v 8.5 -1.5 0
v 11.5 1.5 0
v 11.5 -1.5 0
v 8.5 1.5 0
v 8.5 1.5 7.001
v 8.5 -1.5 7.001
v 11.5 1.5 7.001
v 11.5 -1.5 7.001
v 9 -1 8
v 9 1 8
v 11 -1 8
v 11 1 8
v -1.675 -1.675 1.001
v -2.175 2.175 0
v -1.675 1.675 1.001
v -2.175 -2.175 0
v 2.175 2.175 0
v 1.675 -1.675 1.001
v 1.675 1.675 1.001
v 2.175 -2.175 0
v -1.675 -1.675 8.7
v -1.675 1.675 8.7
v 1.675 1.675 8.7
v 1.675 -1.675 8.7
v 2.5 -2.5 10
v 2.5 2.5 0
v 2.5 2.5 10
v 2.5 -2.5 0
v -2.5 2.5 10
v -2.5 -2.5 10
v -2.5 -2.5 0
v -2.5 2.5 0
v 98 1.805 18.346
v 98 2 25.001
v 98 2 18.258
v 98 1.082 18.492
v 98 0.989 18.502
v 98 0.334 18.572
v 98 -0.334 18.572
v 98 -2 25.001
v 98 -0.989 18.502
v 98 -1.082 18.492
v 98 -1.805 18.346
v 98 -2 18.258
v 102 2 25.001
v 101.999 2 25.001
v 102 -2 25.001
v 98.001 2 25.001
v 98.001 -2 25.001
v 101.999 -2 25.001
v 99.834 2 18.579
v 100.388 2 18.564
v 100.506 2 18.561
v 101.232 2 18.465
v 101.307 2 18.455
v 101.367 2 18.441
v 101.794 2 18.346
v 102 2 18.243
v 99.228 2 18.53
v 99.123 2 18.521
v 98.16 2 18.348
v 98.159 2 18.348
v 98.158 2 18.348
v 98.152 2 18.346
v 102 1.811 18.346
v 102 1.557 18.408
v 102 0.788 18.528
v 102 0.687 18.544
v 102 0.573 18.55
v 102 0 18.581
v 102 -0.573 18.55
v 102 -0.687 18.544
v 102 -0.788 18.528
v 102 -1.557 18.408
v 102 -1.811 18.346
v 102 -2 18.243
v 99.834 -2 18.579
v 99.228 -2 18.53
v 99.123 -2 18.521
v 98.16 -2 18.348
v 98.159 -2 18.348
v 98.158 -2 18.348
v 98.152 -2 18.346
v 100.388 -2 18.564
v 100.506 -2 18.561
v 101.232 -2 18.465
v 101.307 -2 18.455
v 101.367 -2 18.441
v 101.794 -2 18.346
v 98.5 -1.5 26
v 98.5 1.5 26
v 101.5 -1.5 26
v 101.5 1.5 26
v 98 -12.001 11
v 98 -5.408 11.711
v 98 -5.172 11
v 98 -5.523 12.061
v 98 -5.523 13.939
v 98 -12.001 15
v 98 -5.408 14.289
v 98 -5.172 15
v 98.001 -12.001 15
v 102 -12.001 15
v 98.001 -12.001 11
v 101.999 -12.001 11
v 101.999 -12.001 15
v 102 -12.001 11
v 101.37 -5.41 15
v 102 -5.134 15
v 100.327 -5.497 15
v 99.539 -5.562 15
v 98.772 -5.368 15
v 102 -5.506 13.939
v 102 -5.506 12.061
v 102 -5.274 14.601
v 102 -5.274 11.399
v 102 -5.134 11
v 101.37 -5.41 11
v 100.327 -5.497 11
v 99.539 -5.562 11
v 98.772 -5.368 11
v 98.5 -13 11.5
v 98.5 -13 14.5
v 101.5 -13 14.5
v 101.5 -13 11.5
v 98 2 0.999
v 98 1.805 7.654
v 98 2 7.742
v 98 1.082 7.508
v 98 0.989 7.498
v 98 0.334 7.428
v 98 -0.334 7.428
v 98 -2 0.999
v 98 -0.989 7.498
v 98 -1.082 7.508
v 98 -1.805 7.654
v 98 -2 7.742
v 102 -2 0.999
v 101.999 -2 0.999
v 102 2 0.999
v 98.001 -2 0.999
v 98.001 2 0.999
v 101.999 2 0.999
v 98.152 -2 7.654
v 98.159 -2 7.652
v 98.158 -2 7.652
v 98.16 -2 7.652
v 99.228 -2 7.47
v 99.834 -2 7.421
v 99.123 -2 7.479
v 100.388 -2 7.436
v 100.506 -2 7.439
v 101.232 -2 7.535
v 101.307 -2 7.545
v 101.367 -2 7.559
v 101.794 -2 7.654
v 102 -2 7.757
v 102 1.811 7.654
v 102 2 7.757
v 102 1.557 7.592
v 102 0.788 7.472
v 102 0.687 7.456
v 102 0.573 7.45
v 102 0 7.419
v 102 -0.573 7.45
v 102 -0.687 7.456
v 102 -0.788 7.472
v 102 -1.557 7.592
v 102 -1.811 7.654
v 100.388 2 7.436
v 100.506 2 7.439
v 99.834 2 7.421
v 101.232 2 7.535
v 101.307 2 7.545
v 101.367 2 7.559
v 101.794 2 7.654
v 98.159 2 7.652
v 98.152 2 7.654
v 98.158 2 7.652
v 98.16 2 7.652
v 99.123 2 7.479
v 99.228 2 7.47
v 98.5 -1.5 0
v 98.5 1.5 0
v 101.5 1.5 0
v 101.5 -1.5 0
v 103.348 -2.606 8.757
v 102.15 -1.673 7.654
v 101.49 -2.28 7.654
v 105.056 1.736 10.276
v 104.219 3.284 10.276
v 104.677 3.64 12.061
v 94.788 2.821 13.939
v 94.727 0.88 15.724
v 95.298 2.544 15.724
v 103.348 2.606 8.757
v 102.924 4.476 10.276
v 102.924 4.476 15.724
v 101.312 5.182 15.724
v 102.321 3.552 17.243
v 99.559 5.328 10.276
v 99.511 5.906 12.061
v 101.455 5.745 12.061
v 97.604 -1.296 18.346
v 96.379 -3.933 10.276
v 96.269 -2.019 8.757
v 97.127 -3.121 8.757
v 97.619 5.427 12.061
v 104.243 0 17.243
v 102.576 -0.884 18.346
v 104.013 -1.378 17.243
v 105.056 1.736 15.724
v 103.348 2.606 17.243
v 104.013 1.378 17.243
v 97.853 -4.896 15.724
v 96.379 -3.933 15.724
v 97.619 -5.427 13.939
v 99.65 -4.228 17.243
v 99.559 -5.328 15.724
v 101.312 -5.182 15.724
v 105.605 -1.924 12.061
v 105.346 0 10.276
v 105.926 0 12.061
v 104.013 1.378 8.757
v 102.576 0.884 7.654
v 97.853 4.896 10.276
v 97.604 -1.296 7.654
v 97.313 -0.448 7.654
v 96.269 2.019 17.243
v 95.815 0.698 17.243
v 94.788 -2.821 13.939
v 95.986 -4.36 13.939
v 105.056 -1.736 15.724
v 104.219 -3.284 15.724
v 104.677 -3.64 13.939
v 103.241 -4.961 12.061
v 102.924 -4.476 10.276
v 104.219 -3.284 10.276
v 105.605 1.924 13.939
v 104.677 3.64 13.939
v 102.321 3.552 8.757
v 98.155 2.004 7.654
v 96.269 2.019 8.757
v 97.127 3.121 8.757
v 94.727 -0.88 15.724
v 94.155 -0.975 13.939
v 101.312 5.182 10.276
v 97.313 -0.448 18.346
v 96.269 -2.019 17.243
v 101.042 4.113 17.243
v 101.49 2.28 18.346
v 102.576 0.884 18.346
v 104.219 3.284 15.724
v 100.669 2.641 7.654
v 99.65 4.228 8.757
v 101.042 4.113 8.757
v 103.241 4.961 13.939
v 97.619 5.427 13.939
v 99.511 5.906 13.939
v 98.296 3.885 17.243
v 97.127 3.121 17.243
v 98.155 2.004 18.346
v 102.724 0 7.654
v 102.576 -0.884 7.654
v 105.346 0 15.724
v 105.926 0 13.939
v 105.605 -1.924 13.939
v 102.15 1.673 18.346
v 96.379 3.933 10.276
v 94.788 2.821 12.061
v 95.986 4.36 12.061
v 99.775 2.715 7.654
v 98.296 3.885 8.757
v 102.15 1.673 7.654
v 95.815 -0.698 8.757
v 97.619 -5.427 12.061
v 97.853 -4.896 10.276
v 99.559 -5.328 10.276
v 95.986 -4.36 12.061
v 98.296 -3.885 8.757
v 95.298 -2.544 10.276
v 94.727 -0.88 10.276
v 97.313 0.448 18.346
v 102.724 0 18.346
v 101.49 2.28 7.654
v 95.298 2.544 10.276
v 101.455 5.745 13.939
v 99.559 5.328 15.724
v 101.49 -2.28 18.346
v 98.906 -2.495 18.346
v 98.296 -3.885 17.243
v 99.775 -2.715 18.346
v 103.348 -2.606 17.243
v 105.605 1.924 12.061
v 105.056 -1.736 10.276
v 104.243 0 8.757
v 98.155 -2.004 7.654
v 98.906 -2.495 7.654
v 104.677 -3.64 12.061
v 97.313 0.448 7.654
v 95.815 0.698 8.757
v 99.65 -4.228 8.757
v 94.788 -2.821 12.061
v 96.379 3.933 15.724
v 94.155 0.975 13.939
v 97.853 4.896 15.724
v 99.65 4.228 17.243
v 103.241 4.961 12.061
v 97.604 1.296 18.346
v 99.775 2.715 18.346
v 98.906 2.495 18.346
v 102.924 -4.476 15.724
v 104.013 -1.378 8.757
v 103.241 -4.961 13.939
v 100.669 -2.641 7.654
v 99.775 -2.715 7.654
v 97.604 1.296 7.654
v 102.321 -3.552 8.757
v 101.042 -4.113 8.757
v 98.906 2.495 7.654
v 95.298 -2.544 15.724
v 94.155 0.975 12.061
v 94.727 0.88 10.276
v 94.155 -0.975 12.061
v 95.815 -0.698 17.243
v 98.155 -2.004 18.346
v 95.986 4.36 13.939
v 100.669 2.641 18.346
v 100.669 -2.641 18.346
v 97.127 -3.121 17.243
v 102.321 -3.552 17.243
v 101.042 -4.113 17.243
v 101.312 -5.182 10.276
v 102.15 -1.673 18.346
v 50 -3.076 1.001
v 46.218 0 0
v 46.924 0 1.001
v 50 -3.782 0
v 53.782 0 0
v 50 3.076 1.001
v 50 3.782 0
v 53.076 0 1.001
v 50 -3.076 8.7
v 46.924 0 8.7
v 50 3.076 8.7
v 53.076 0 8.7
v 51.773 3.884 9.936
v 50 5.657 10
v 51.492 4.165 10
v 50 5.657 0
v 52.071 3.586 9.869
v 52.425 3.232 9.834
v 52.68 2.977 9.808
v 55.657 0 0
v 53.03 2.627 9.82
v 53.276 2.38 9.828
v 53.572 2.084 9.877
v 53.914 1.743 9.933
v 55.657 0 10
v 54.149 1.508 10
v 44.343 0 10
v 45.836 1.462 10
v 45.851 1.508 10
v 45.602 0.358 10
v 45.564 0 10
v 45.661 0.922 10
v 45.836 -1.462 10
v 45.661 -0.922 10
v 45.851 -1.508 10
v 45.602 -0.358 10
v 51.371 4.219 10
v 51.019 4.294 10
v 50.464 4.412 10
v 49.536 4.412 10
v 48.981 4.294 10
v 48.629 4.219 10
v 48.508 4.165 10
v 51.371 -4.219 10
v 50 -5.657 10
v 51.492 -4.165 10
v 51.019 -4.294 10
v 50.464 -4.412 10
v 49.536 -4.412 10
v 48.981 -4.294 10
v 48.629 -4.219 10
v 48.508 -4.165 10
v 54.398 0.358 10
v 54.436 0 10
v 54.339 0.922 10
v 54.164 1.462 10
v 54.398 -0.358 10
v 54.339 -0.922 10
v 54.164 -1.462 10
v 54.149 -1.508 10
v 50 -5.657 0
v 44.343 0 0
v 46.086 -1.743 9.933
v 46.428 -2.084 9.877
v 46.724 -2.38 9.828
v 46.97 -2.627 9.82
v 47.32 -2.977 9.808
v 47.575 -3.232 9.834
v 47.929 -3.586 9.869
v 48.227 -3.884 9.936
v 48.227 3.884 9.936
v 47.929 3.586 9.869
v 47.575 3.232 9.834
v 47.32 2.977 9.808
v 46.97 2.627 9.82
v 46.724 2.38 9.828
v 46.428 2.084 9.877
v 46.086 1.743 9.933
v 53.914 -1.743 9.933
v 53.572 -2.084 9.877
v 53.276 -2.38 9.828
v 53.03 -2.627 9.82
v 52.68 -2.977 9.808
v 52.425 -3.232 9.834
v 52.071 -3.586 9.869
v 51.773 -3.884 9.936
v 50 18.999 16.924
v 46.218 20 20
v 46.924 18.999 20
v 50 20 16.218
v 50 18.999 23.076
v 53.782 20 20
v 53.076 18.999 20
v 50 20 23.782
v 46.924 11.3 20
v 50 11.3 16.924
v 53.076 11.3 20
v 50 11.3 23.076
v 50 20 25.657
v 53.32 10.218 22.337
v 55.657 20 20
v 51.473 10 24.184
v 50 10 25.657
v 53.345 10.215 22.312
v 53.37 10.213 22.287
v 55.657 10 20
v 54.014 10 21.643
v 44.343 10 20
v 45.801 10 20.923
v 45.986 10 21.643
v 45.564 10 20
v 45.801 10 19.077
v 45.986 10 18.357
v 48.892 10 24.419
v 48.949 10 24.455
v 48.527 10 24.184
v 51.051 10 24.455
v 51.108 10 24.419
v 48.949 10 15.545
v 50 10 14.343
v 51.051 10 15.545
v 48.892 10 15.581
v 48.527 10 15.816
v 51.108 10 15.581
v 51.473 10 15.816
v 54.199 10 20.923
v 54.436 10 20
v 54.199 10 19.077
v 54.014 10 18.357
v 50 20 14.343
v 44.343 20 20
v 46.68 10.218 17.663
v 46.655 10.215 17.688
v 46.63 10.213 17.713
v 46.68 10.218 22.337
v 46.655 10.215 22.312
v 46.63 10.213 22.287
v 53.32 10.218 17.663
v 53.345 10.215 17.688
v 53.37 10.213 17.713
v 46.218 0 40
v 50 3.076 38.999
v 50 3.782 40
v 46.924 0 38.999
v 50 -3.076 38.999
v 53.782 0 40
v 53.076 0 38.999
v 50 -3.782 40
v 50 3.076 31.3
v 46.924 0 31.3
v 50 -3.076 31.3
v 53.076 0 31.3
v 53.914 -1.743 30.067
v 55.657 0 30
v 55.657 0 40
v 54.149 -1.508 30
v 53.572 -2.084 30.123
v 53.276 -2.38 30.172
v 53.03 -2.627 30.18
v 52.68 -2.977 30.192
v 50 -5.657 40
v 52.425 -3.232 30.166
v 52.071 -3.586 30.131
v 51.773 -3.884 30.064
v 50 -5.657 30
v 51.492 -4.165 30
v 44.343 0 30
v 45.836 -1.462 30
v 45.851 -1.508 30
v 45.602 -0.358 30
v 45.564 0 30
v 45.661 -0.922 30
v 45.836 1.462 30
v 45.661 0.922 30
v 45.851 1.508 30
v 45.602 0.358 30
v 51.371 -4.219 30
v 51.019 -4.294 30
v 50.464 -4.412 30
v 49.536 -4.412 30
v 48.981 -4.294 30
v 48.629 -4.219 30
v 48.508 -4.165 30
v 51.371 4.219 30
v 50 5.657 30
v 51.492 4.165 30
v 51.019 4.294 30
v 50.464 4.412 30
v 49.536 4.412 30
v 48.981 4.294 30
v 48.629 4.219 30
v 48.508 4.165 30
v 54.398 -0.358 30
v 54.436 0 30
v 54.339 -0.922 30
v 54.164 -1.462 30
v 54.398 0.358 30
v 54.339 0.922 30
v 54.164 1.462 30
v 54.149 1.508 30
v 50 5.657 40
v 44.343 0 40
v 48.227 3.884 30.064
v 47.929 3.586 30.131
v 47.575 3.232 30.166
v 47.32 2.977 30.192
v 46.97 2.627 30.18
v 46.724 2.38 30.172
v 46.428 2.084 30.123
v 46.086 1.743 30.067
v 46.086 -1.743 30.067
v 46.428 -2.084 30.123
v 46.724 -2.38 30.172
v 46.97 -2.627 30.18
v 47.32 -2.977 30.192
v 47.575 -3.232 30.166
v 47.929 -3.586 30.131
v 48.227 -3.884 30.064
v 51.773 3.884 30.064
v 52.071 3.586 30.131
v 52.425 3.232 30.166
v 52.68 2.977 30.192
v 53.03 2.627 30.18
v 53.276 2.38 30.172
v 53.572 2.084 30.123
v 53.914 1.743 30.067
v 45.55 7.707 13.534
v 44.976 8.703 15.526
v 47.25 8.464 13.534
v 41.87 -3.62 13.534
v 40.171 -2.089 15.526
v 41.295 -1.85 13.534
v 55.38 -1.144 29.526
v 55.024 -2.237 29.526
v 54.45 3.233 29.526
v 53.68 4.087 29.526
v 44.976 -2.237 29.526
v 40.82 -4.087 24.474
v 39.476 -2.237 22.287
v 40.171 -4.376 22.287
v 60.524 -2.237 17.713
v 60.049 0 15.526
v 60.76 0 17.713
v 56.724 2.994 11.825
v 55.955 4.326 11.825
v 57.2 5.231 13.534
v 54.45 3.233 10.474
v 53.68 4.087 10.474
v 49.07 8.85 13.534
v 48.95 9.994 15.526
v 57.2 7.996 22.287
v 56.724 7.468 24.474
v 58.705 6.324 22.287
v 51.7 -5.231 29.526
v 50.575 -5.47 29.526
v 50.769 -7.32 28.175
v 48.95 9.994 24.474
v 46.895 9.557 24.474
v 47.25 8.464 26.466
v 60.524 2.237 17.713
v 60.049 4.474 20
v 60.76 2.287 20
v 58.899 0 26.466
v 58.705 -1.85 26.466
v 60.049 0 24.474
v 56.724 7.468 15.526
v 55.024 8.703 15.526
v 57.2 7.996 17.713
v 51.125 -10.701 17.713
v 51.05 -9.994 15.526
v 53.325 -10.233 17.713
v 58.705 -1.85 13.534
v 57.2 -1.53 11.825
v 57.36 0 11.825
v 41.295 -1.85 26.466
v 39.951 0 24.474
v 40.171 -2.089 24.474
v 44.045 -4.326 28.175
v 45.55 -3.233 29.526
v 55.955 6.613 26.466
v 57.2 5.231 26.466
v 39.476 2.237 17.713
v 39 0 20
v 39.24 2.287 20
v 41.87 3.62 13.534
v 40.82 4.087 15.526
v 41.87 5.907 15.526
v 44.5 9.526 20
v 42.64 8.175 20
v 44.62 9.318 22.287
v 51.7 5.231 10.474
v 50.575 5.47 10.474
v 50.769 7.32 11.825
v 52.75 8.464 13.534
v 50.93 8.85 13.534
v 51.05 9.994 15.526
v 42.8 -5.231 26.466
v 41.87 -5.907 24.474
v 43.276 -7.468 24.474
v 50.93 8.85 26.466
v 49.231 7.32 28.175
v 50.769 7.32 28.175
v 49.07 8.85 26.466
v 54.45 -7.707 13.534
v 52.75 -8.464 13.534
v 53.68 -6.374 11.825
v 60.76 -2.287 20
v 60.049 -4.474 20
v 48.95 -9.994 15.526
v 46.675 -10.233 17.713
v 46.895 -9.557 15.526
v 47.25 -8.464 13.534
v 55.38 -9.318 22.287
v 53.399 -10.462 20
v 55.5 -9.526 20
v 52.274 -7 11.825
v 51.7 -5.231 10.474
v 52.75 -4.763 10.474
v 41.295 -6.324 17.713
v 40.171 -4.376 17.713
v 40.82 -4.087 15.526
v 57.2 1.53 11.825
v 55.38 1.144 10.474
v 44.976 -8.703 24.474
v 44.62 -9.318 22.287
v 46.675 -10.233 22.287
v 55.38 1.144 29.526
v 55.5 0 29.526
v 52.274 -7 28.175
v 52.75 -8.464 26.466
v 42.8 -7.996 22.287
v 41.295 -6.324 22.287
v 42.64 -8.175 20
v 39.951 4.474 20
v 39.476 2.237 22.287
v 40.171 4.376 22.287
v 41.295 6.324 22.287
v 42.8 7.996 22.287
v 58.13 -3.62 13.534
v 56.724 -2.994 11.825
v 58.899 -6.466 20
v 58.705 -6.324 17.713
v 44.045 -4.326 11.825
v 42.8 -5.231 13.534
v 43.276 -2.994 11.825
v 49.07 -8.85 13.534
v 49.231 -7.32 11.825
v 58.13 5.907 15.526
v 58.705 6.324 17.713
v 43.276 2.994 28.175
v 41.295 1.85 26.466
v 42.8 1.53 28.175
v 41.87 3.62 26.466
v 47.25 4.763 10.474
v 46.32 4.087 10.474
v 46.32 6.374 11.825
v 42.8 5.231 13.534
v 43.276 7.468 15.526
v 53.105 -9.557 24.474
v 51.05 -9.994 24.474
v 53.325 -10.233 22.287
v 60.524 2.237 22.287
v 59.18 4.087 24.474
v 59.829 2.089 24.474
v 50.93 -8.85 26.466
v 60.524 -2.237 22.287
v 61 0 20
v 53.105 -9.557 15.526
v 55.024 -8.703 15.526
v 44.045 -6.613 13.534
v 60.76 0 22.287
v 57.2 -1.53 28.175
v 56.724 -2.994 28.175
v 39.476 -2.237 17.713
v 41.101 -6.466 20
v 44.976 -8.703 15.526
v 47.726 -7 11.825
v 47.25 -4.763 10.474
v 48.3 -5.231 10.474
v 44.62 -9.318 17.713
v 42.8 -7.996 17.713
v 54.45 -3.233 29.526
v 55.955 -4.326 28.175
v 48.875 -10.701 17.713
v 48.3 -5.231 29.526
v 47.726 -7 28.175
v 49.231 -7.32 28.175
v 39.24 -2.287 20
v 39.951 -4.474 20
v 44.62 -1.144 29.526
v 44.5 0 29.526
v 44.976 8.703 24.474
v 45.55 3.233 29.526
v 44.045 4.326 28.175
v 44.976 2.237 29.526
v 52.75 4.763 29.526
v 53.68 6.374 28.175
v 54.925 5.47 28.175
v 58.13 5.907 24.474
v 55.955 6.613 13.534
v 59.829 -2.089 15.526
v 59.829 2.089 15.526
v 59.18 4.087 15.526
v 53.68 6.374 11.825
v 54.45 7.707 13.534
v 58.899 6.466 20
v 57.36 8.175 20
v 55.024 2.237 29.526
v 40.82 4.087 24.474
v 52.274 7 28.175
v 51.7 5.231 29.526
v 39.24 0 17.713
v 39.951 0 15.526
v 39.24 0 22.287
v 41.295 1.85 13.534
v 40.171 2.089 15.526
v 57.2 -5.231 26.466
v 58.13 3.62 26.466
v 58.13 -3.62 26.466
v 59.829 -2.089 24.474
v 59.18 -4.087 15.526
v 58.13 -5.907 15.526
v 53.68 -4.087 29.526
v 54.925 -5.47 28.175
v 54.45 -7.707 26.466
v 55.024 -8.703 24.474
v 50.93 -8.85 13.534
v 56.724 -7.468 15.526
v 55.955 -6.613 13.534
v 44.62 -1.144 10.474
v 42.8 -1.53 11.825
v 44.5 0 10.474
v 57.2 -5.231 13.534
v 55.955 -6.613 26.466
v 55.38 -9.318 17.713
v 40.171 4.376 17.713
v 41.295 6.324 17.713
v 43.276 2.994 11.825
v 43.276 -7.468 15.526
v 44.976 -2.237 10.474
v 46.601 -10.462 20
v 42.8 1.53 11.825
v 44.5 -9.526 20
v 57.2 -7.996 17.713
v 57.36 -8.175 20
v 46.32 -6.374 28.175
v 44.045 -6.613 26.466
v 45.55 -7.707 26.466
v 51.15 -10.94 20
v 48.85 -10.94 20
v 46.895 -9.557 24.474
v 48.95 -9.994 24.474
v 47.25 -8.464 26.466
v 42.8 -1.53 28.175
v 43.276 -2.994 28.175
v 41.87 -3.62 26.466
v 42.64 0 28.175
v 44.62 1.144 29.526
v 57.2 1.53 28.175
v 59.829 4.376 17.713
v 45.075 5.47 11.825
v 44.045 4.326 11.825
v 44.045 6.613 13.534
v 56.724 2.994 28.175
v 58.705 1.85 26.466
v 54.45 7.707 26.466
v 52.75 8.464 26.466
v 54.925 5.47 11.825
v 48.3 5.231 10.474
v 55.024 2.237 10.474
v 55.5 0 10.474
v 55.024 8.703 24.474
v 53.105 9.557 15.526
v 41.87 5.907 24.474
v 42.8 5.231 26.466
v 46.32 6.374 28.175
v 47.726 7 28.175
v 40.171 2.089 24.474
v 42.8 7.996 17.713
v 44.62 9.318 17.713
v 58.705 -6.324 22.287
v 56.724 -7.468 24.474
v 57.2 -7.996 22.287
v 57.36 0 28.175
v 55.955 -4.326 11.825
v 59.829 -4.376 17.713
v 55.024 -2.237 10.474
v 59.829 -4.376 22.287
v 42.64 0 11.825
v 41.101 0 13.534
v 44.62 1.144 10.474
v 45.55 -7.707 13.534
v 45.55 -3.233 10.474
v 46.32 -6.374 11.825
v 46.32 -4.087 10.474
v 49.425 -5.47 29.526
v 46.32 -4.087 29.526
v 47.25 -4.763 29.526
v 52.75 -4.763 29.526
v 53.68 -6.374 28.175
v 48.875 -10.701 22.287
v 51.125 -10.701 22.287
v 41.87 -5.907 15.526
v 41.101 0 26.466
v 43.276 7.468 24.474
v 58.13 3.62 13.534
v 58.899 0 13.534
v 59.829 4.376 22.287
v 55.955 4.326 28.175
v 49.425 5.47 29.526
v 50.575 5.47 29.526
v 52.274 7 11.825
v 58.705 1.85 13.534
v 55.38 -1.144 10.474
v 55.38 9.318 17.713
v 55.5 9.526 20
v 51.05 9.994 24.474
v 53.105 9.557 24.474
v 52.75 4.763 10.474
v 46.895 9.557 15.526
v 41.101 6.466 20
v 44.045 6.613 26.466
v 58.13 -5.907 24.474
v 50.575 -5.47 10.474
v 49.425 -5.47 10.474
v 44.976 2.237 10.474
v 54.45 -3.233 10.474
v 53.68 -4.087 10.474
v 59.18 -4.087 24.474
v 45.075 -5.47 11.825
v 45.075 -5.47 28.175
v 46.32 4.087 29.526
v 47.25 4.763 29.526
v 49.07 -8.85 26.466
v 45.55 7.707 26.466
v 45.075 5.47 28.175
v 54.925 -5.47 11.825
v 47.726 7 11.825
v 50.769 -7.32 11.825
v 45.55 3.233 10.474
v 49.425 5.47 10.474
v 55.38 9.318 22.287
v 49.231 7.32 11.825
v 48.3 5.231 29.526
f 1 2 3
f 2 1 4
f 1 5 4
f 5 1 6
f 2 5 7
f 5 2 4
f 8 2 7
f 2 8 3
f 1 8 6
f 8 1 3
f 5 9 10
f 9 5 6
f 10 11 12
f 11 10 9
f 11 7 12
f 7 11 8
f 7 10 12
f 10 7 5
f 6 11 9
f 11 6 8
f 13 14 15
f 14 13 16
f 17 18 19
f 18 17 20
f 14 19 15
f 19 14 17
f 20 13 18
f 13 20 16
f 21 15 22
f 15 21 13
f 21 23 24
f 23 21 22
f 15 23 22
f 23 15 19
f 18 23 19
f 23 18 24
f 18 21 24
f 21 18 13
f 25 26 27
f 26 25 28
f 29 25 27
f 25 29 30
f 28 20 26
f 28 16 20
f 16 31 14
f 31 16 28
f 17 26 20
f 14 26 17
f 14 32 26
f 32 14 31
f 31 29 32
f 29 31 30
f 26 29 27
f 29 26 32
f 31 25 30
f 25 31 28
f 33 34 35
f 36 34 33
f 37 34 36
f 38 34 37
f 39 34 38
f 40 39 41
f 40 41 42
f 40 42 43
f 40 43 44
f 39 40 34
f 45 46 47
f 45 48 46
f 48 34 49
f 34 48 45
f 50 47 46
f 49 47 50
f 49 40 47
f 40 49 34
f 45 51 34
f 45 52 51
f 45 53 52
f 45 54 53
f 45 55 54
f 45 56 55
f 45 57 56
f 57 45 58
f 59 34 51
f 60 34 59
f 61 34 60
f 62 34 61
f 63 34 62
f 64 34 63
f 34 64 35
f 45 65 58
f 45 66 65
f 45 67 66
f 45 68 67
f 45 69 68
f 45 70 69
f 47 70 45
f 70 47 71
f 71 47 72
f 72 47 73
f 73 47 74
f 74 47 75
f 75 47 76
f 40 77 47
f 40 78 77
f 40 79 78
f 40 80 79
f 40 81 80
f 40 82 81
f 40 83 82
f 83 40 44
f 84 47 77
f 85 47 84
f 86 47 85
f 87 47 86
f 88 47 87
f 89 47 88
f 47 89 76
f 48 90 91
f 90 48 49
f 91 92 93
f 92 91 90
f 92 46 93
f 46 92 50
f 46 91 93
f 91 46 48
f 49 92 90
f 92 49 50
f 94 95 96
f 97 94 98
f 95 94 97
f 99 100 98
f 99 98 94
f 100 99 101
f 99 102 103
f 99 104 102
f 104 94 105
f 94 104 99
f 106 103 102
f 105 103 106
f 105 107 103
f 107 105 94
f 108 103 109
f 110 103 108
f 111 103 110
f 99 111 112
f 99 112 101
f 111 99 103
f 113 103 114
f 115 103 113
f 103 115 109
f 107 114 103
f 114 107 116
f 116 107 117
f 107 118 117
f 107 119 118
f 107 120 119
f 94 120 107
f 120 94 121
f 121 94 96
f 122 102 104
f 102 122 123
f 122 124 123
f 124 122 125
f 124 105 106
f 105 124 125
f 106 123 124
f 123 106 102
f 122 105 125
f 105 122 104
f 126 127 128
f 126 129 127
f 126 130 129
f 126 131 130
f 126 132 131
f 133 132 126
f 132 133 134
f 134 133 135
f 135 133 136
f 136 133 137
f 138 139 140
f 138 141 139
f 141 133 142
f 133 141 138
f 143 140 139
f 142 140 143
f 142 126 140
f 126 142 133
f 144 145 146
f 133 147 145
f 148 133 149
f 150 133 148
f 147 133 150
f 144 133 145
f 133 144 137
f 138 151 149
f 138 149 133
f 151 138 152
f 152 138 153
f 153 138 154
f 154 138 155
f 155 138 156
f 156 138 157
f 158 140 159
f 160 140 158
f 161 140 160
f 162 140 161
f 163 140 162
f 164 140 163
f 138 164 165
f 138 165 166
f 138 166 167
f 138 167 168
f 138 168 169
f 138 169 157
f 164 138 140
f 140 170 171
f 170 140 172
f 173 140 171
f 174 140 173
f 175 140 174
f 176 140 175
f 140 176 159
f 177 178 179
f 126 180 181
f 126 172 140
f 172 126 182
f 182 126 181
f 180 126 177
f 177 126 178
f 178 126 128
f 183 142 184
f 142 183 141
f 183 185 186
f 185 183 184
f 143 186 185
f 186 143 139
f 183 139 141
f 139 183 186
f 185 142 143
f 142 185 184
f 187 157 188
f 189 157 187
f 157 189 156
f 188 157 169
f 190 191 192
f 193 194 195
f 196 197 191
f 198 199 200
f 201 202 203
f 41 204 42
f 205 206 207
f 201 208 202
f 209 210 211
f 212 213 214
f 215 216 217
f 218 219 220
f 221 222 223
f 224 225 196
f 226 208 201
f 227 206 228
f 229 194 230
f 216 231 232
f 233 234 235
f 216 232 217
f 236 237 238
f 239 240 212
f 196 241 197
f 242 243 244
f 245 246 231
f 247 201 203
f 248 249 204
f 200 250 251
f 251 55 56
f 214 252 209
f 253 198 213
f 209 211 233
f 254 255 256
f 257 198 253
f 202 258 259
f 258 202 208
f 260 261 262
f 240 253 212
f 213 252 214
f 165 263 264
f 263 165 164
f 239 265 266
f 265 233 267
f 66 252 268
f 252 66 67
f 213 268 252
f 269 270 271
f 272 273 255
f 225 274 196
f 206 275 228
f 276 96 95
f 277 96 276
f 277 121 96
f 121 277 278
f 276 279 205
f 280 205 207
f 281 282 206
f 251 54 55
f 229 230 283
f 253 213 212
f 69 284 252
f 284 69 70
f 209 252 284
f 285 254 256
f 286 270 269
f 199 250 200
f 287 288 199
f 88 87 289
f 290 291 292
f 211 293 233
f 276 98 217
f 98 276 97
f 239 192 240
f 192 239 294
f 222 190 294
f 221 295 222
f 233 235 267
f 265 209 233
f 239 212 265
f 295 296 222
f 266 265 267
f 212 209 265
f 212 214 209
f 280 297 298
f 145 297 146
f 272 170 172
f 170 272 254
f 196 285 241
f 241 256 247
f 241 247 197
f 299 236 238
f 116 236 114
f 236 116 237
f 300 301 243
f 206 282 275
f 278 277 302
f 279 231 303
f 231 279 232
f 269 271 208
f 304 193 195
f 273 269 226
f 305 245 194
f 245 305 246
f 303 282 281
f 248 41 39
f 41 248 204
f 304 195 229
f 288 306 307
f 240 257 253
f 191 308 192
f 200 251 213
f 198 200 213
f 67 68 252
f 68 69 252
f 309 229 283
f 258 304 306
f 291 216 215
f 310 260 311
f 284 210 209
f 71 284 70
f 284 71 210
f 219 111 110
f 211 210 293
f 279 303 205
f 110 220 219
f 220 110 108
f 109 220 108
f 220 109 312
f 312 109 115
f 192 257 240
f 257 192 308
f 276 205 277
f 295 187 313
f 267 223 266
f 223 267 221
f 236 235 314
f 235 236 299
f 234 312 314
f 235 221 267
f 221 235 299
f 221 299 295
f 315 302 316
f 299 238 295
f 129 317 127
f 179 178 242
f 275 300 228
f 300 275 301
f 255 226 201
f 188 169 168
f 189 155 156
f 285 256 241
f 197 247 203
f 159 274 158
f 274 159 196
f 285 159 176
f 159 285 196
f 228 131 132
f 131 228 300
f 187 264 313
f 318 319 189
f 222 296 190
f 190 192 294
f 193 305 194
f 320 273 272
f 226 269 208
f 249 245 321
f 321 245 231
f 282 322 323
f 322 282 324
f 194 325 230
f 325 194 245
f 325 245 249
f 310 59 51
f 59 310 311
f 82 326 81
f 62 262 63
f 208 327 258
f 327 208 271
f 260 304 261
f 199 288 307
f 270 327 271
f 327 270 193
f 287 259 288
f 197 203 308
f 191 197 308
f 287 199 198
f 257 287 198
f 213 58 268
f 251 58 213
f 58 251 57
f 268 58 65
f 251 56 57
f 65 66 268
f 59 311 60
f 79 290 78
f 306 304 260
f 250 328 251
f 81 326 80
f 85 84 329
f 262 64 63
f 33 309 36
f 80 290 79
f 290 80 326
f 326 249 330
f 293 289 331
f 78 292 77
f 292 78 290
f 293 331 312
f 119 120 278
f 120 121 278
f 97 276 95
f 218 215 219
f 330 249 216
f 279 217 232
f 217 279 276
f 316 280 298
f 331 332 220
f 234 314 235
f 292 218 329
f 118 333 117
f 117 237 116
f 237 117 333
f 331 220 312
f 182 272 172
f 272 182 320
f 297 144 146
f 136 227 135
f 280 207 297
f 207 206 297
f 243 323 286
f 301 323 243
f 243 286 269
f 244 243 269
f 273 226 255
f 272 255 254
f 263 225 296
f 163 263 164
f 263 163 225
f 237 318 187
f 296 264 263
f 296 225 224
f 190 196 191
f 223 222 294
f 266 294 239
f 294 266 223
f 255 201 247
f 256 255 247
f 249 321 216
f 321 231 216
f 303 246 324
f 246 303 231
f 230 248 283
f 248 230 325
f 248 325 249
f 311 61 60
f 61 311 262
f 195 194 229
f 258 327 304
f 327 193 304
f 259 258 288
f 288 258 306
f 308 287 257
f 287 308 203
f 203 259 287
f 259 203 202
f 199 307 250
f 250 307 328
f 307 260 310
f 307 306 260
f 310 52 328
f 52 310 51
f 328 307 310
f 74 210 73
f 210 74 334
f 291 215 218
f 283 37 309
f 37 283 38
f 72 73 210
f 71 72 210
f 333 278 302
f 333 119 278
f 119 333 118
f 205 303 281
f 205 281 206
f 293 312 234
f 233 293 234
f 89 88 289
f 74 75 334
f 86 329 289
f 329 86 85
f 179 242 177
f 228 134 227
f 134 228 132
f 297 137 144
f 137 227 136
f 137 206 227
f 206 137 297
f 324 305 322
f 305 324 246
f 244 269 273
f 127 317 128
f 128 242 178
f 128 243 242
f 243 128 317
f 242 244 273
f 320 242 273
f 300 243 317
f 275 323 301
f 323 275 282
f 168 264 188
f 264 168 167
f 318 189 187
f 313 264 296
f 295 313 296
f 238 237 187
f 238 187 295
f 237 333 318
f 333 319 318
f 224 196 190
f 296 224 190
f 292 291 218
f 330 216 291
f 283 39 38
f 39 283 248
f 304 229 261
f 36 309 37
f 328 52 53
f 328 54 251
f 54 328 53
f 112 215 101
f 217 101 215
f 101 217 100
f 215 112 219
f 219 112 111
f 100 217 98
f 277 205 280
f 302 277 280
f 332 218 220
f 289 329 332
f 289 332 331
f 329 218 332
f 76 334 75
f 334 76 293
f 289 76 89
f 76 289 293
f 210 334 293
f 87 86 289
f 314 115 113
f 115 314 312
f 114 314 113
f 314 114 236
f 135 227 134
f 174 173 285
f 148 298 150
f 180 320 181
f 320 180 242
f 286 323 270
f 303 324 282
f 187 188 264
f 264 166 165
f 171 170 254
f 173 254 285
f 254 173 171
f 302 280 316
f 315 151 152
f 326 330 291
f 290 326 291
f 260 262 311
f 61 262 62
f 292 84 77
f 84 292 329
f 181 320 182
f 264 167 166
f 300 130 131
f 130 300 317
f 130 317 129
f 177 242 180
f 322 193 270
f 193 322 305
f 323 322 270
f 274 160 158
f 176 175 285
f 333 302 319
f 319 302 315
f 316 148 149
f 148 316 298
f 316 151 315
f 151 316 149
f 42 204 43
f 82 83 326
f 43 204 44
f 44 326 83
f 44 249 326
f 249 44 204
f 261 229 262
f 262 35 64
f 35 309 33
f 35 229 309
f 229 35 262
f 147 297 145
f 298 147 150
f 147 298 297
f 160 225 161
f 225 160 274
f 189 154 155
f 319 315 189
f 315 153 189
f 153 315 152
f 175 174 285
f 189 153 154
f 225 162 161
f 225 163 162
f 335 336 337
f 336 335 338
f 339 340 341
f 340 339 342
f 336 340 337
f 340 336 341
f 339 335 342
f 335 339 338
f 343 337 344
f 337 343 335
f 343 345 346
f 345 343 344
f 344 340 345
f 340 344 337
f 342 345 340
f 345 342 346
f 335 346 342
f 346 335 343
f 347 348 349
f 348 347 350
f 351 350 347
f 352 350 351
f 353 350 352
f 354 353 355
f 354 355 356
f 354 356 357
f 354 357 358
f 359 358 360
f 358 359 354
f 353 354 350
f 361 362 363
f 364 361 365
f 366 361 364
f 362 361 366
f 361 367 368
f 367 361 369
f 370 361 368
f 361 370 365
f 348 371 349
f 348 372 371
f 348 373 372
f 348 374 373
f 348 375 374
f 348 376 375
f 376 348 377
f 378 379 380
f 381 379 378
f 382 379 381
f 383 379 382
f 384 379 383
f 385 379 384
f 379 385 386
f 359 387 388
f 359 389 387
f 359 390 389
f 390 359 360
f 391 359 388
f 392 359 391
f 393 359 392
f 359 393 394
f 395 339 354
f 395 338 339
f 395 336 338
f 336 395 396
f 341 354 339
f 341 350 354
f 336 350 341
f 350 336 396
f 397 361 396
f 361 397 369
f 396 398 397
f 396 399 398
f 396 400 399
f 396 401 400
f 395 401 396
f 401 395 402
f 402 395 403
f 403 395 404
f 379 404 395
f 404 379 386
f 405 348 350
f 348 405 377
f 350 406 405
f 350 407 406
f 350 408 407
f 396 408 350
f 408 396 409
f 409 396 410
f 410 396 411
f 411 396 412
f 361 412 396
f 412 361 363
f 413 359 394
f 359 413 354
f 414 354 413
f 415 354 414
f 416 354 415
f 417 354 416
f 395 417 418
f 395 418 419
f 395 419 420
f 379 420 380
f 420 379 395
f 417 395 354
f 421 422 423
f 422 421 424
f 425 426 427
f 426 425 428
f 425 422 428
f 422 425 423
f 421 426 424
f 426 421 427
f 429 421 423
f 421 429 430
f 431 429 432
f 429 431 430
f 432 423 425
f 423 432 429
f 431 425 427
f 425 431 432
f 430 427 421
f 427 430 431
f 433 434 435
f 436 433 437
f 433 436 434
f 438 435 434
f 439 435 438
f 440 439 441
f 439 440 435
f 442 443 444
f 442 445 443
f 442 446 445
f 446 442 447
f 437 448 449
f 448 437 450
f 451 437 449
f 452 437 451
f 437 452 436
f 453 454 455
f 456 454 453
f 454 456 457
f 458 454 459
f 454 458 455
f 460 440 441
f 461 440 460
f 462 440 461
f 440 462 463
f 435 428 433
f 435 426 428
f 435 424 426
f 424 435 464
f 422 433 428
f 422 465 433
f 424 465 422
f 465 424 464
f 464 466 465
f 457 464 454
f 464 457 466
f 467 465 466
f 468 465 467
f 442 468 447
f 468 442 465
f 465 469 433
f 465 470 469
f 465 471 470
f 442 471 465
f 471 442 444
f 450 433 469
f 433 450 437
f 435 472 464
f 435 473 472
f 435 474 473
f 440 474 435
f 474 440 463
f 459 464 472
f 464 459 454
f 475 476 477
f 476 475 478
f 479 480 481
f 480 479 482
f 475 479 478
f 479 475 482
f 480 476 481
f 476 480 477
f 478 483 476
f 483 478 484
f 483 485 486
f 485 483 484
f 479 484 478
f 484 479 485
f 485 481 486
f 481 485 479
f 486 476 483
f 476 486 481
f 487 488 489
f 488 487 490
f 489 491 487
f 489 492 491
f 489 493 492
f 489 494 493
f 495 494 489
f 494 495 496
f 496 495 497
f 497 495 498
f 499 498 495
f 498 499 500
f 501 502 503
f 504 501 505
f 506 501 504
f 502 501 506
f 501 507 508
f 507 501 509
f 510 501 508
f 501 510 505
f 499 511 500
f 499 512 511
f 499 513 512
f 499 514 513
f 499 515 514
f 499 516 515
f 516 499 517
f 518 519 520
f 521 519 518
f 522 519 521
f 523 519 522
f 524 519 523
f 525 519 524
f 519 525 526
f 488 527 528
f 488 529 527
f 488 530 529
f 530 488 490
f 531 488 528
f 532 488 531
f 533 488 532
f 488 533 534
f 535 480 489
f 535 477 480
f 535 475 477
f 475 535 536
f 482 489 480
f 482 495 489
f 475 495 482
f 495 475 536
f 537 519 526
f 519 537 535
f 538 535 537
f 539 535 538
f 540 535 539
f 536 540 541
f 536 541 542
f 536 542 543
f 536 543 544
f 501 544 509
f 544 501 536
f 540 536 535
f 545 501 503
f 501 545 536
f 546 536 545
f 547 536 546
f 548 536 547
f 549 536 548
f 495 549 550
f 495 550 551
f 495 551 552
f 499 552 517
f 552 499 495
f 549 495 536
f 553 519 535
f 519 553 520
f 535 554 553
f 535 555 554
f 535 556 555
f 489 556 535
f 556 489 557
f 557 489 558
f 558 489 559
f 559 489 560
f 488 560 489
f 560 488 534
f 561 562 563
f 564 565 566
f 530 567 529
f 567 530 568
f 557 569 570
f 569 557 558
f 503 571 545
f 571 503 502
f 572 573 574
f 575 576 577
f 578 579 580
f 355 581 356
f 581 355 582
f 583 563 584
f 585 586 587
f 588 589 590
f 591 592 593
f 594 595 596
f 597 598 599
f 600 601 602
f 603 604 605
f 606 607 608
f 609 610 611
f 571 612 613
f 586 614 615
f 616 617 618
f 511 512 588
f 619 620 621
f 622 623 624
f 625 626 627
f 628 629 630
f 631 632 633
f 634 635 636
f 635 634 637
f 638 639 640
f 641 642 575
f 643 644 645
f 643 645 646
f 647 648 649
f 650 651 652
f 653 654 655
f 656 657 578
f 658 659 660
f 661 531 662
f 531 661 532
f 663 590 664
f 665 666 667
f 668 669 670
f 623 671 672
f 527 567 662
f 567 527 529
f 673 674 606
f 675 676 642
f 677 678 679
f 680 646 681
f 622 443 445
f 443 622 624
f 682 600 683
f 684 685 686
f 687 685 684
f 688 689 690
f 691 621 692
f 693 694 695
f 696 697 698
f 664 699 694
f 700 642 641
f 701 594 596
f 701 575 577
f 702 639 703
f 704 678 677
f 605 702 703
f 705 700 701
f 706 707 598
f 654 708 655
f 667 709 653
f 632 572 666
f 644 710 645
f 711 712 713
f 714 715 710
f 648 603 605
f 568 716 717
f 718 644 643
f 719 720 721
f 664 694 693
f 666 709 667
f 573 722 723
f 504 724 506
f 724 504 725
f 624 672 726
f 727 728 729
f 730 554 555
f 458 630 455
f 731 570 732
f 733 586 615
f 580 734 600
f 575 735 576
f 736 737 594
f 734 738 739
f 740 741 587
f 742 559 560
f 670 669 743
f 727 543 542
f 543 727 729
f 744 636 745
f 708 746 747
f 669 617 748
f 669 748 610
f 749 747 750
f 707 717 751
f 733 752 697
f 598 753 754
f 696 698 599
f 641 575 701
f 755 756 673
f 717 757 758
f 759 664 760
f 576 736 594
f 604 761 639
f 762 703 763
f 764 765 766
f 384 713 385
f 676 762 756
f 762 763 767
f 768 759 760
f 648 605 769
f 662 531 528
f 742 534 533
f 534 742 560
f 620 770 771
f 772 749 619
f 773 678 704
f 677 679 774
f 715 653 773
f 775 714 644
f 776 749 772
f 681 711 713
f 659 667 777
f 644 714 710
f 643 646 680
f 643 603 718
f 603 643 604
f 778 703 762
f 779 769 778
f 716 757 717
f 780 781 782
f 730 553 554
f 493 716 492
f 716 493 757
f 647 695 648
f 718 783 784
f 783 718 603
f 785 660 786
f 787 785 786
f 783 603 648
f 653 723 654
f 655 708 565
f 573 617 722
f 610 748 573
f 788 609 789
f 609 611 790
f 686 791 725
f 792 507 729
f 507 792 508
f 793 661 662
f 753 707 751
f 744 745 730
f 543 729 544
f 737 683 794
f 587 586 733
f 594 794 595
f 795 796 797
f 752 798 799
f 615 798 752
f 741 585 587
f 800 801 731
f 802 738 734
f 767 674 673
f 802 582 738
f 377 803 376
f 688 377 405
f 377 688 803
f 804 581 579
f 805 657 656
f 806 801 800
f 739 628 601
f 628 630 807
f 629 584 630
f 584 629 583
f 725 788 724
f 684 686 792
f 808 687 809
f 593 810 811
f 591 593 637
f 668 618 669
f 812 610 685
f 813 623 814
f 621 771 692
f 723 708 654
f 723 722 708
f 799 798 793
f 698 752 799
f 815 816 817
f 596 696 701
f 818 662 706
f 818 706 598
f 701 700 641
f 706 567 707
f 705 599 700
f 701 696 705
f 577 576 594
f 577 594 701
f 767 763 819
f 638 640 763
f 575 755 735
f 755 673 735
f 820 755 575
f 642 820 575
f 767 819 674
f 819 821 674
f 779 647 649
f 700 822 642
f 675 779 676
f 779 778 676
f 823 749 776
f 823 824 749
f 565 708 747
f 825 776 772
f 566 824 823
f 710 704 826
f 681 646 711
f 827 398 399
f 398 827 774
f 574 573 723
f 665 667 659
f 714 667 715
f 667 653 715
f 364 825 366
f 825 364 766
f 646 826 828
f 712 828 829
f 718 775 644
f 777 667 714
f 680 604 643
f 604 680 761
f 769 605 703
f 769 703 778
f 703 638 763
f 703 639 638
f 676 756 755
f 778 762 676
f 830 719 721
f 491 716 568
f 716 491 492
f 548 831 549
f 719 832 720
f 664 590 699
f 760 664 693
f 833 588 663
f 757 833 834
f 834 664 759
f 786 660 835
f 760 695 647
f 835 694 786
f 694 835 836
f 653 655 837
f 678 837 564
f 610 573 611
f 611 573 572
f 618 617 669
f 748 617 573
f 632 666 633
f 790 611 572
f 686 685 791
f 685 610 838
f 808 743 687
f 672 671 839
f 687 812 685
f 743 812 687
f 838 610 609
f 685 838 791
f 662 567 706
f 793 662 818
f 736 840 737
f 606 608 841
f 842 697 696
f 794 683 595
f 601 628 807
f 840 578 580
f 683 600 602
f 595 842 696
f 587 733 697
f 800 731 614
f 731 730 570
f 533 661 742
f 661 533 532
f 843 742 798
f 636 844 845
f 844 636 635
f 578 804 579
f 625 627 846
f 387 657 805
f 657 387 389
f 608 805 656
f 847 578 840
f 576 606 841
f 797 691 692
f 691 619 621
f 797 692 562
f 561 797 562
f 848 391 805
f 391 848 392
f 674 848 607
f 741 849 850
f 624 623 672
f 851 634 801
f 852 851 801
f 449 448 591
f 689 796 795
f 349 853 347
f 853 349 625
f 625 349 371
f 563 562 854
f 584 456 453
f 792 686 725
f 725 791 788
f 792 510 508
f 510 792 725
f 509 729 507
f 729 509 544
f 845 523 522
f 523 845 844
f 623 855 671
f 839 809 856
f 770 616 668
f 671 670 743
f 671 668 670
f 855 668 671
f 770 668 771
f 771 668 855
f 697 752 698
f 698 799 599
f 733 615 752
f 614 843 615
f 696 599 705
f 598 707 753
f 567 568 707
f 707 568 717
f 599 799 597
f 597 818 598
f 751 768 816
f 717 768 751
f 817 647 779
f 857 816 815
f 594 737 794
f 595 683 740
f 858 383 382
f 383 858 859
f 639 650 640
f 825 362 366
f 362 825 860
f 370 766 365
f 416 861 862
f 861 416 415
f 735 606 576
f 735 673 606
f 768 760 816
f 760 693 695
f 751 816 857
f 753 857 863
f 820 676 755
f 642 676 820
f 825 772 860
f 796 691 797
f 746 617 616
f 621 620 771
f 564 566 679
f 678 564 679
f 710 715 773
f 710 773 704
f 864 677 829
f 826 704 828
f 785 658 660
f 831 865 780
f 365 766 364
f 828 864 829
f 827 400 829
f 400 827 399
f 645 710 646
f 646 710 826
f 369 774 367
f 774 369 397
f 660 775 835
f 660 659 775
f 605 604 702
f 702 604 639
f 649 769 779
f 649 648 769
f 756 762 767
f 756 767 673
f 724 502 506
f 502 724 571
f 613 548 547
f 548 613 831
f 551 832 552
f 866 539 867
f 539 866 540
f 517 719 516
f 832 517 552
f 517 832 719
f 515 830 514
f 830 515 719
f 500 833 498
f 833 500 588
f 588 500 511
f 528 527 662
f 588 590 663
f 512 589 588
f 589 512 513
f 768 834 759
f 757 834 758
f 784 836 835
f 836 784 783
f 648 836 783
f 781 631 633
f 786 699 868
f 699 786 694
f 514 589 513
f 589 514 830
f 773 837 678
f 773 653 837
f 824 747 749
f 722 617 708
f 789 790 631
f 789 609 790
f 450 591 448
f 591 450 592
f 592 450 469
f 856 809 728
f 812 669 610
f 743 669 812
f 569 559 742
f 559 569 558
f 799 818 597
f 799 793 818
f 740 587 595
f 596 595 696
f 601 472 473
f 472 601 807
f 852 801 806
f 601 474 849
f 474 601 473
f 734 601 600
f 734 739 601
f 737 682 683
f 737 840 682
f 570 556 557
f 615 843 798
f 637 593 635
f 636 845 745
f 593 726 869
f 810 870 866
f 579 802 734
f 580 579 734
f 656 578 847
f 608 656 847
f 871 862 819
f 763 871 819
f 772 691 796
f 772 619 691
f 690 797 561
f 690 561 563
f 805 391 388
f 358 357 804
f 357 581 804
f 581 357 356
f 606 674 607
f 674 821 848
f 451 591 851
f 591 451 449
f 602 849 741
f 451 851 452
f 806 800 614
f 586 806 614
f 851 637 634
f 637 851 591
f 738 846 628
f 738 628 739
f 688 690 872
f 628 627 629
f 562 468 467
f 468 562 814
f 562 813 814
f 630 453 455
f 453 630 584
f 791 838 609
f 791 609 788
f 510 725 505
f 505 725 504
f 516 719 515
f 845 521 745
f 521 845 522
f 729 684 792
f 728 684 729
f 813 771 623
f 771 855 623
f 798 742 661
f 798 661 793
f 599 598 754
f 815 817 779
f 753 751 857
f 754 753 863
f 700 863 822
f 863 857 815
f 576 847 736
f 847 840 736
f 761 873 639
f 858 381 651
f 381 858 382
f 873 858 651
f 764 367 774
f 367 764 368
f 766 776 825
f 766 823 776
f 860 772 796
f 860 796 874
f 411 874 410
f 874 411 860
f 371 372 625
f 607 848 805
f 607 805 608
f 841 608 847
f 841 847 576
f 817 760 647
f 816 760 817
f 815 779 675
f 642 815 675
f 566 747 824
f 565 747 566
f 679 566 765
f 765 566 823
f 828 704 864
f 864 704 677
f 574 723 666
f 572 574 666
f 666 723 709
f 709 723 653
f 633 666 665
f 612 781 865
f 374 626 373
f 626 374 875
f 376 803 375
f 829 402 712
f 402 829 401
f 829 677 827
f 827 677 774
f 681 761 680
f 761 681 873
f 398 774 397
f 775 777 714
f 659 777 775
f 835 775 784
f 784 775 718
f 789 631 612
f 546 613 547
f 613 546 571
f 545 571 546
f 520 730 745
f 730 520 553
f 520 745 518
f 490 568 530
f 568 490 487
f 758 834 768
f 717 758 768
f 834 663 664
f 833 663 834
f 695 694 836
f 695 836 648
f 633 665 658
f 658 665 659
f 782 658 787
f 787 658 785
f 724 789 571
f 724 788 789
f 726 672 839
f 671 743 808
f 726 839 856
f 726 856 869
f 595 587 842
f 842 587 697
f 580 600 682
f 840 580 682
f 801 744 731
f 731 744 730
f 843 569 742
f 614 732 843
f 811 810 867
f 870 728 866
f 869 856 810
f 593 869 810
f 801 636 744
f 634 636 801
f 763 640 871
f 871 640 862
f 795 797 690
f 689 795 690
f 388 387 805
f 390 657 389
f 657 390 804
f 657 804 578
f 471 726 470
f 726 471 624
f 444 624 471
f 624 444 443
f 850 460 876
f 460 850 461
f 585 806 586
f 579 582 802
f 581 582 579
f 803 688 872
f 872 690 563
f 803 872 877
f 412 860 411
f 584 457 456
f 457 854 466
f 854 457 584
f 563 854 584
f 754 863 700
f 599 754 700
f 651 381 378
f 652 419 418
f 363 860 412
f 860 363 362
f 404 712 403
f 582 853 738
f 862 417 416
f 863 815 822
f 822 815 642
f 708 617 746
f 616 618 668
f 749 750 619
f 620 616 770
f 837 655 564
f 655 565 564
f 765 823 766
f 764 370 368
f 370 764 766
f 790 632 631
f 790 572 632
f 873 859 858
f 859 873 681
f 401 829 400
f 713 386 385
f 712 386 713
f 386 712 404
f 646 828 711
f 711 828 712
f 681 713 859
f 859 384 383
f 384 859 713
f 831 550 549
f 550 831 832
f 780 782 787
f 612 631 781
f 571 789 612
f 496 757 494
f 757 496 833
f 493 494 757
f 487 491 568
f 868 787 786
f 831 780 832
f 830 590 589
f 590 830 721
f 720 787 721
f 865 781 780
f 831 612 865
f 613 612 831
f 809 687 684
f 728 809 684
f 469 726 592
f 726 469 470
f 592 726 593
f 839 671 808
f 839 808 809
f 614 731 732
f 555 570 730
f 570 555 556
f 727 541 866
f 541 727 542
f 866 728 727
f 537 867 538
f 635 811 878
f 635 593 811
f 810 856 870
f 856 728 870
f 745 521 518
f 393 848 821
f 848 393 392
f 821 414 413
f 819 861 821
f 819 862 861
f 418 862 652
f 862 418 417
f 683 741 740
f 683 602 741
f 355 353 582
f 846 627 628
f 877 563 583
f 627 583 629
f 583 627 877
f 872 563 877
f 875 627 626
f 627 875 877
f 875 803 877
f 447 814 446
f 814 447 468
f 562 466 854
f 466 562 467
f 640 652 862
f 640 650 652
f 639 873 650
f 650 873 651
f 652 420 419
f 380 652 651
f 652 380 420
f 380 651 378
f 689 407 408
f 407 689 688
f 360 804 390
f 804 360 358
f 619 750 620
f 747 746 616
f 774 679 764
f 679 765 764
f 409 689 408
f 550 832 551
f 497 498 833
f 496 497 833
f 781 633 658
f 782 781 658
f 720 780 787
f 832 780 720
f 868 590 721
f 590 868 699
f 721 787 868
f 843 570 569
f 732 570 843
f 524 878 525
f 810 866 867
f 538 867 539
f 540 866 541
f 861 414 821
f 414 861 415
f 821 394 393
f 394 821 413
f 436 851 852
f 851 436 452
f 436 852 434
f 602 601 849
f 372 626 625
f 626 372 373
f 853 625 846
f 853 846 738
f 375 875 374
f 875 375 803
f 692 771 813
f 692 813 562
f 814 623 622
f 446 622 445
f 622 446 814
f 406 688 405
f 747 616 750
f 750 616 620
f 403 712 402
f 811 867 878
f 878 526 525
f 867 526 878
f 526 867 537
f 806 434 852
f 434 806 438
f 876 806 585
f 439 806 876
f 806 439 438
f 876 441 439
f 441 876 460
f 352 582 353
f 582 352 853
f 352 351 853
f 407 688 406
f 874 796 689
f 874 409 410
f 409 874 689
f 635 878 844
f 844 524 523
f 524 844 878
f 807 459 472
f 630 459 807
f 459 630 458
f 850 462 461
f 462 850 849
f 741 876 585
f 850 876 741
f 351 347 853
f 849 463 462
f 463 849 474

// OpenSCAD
// let's only do slop on the tenon!!!


translate([10,0,0])
tenon(3,8);

mortise_socket(5, 10, 3, 8);

union() {
  translate([100,0,13])
  tenon_print_test();

  translate([50,0,20])
  mortise_socket_print_test();
  
}

module mortise_socket_print_test() {
  sphere(11);
  for (a=[0:90:180]) {
    rotate([a,0,])
    rotate([0,0,45])
    translate([0,0,-20])
    mortise_socket(8, 10, 4, 8);
  }
}

module tenon_print_test() {
  sphere(6);
  for (a=[0:90:180]) {
    rotate([a,0,0])
    translate([0,0,5])
    tenon(4, 8);
  }
}


module mortise_socket(socket_width, socket_height, width, depth, slop=.35, chamfer=1) {
  difference() {
    translate([-socket_width/2,-socket_width/2,0])
    cube([socket_width, socket_width, socket_height]);
    mortise(width, depth, slop, chamfer);
  }
}


// the mortise is the hole... diff this
module mortise(width, depth, slop=.1, chamfer=1) {
  eWidth = width+slop; // effective width
  eDepth = depth+slop*2;
  scale = eWidth / (eWidth + chamfer);
  translate([0,0,-.001])
  linear_extrude(chamfer+.002, scale=scale)
  translate([-eWidth/2-chamfer/2,-eWidth/2-chamfer/2])
  square(eWidth+chamfer);

  translate([0,0,chamfer])
  linear_extrude(eDepth-chamfer)
  translate([-eWidth/2,-eWidth/2])
  square(eWidth);
}

// the tenon is the male part... union this
module tenon(width, depth, slop=0, chamfer=1) {
  eWidth = width-slop; // effective width
  eDepth = depth-slop;
  linear_extrude(eDepth-chamfer + .001)
  translate([-eWidth/2,-eWidth/2])
  square(eWidth);
  
  scale = (eWidth - chamfer) / eWidth;
  translate([0,0,eDepth-chamfer])
  linear_extrude(chamfer, scale=scale)
  translate([-eWidth/2,-eWidth/2])
  square(eWidth);
}
